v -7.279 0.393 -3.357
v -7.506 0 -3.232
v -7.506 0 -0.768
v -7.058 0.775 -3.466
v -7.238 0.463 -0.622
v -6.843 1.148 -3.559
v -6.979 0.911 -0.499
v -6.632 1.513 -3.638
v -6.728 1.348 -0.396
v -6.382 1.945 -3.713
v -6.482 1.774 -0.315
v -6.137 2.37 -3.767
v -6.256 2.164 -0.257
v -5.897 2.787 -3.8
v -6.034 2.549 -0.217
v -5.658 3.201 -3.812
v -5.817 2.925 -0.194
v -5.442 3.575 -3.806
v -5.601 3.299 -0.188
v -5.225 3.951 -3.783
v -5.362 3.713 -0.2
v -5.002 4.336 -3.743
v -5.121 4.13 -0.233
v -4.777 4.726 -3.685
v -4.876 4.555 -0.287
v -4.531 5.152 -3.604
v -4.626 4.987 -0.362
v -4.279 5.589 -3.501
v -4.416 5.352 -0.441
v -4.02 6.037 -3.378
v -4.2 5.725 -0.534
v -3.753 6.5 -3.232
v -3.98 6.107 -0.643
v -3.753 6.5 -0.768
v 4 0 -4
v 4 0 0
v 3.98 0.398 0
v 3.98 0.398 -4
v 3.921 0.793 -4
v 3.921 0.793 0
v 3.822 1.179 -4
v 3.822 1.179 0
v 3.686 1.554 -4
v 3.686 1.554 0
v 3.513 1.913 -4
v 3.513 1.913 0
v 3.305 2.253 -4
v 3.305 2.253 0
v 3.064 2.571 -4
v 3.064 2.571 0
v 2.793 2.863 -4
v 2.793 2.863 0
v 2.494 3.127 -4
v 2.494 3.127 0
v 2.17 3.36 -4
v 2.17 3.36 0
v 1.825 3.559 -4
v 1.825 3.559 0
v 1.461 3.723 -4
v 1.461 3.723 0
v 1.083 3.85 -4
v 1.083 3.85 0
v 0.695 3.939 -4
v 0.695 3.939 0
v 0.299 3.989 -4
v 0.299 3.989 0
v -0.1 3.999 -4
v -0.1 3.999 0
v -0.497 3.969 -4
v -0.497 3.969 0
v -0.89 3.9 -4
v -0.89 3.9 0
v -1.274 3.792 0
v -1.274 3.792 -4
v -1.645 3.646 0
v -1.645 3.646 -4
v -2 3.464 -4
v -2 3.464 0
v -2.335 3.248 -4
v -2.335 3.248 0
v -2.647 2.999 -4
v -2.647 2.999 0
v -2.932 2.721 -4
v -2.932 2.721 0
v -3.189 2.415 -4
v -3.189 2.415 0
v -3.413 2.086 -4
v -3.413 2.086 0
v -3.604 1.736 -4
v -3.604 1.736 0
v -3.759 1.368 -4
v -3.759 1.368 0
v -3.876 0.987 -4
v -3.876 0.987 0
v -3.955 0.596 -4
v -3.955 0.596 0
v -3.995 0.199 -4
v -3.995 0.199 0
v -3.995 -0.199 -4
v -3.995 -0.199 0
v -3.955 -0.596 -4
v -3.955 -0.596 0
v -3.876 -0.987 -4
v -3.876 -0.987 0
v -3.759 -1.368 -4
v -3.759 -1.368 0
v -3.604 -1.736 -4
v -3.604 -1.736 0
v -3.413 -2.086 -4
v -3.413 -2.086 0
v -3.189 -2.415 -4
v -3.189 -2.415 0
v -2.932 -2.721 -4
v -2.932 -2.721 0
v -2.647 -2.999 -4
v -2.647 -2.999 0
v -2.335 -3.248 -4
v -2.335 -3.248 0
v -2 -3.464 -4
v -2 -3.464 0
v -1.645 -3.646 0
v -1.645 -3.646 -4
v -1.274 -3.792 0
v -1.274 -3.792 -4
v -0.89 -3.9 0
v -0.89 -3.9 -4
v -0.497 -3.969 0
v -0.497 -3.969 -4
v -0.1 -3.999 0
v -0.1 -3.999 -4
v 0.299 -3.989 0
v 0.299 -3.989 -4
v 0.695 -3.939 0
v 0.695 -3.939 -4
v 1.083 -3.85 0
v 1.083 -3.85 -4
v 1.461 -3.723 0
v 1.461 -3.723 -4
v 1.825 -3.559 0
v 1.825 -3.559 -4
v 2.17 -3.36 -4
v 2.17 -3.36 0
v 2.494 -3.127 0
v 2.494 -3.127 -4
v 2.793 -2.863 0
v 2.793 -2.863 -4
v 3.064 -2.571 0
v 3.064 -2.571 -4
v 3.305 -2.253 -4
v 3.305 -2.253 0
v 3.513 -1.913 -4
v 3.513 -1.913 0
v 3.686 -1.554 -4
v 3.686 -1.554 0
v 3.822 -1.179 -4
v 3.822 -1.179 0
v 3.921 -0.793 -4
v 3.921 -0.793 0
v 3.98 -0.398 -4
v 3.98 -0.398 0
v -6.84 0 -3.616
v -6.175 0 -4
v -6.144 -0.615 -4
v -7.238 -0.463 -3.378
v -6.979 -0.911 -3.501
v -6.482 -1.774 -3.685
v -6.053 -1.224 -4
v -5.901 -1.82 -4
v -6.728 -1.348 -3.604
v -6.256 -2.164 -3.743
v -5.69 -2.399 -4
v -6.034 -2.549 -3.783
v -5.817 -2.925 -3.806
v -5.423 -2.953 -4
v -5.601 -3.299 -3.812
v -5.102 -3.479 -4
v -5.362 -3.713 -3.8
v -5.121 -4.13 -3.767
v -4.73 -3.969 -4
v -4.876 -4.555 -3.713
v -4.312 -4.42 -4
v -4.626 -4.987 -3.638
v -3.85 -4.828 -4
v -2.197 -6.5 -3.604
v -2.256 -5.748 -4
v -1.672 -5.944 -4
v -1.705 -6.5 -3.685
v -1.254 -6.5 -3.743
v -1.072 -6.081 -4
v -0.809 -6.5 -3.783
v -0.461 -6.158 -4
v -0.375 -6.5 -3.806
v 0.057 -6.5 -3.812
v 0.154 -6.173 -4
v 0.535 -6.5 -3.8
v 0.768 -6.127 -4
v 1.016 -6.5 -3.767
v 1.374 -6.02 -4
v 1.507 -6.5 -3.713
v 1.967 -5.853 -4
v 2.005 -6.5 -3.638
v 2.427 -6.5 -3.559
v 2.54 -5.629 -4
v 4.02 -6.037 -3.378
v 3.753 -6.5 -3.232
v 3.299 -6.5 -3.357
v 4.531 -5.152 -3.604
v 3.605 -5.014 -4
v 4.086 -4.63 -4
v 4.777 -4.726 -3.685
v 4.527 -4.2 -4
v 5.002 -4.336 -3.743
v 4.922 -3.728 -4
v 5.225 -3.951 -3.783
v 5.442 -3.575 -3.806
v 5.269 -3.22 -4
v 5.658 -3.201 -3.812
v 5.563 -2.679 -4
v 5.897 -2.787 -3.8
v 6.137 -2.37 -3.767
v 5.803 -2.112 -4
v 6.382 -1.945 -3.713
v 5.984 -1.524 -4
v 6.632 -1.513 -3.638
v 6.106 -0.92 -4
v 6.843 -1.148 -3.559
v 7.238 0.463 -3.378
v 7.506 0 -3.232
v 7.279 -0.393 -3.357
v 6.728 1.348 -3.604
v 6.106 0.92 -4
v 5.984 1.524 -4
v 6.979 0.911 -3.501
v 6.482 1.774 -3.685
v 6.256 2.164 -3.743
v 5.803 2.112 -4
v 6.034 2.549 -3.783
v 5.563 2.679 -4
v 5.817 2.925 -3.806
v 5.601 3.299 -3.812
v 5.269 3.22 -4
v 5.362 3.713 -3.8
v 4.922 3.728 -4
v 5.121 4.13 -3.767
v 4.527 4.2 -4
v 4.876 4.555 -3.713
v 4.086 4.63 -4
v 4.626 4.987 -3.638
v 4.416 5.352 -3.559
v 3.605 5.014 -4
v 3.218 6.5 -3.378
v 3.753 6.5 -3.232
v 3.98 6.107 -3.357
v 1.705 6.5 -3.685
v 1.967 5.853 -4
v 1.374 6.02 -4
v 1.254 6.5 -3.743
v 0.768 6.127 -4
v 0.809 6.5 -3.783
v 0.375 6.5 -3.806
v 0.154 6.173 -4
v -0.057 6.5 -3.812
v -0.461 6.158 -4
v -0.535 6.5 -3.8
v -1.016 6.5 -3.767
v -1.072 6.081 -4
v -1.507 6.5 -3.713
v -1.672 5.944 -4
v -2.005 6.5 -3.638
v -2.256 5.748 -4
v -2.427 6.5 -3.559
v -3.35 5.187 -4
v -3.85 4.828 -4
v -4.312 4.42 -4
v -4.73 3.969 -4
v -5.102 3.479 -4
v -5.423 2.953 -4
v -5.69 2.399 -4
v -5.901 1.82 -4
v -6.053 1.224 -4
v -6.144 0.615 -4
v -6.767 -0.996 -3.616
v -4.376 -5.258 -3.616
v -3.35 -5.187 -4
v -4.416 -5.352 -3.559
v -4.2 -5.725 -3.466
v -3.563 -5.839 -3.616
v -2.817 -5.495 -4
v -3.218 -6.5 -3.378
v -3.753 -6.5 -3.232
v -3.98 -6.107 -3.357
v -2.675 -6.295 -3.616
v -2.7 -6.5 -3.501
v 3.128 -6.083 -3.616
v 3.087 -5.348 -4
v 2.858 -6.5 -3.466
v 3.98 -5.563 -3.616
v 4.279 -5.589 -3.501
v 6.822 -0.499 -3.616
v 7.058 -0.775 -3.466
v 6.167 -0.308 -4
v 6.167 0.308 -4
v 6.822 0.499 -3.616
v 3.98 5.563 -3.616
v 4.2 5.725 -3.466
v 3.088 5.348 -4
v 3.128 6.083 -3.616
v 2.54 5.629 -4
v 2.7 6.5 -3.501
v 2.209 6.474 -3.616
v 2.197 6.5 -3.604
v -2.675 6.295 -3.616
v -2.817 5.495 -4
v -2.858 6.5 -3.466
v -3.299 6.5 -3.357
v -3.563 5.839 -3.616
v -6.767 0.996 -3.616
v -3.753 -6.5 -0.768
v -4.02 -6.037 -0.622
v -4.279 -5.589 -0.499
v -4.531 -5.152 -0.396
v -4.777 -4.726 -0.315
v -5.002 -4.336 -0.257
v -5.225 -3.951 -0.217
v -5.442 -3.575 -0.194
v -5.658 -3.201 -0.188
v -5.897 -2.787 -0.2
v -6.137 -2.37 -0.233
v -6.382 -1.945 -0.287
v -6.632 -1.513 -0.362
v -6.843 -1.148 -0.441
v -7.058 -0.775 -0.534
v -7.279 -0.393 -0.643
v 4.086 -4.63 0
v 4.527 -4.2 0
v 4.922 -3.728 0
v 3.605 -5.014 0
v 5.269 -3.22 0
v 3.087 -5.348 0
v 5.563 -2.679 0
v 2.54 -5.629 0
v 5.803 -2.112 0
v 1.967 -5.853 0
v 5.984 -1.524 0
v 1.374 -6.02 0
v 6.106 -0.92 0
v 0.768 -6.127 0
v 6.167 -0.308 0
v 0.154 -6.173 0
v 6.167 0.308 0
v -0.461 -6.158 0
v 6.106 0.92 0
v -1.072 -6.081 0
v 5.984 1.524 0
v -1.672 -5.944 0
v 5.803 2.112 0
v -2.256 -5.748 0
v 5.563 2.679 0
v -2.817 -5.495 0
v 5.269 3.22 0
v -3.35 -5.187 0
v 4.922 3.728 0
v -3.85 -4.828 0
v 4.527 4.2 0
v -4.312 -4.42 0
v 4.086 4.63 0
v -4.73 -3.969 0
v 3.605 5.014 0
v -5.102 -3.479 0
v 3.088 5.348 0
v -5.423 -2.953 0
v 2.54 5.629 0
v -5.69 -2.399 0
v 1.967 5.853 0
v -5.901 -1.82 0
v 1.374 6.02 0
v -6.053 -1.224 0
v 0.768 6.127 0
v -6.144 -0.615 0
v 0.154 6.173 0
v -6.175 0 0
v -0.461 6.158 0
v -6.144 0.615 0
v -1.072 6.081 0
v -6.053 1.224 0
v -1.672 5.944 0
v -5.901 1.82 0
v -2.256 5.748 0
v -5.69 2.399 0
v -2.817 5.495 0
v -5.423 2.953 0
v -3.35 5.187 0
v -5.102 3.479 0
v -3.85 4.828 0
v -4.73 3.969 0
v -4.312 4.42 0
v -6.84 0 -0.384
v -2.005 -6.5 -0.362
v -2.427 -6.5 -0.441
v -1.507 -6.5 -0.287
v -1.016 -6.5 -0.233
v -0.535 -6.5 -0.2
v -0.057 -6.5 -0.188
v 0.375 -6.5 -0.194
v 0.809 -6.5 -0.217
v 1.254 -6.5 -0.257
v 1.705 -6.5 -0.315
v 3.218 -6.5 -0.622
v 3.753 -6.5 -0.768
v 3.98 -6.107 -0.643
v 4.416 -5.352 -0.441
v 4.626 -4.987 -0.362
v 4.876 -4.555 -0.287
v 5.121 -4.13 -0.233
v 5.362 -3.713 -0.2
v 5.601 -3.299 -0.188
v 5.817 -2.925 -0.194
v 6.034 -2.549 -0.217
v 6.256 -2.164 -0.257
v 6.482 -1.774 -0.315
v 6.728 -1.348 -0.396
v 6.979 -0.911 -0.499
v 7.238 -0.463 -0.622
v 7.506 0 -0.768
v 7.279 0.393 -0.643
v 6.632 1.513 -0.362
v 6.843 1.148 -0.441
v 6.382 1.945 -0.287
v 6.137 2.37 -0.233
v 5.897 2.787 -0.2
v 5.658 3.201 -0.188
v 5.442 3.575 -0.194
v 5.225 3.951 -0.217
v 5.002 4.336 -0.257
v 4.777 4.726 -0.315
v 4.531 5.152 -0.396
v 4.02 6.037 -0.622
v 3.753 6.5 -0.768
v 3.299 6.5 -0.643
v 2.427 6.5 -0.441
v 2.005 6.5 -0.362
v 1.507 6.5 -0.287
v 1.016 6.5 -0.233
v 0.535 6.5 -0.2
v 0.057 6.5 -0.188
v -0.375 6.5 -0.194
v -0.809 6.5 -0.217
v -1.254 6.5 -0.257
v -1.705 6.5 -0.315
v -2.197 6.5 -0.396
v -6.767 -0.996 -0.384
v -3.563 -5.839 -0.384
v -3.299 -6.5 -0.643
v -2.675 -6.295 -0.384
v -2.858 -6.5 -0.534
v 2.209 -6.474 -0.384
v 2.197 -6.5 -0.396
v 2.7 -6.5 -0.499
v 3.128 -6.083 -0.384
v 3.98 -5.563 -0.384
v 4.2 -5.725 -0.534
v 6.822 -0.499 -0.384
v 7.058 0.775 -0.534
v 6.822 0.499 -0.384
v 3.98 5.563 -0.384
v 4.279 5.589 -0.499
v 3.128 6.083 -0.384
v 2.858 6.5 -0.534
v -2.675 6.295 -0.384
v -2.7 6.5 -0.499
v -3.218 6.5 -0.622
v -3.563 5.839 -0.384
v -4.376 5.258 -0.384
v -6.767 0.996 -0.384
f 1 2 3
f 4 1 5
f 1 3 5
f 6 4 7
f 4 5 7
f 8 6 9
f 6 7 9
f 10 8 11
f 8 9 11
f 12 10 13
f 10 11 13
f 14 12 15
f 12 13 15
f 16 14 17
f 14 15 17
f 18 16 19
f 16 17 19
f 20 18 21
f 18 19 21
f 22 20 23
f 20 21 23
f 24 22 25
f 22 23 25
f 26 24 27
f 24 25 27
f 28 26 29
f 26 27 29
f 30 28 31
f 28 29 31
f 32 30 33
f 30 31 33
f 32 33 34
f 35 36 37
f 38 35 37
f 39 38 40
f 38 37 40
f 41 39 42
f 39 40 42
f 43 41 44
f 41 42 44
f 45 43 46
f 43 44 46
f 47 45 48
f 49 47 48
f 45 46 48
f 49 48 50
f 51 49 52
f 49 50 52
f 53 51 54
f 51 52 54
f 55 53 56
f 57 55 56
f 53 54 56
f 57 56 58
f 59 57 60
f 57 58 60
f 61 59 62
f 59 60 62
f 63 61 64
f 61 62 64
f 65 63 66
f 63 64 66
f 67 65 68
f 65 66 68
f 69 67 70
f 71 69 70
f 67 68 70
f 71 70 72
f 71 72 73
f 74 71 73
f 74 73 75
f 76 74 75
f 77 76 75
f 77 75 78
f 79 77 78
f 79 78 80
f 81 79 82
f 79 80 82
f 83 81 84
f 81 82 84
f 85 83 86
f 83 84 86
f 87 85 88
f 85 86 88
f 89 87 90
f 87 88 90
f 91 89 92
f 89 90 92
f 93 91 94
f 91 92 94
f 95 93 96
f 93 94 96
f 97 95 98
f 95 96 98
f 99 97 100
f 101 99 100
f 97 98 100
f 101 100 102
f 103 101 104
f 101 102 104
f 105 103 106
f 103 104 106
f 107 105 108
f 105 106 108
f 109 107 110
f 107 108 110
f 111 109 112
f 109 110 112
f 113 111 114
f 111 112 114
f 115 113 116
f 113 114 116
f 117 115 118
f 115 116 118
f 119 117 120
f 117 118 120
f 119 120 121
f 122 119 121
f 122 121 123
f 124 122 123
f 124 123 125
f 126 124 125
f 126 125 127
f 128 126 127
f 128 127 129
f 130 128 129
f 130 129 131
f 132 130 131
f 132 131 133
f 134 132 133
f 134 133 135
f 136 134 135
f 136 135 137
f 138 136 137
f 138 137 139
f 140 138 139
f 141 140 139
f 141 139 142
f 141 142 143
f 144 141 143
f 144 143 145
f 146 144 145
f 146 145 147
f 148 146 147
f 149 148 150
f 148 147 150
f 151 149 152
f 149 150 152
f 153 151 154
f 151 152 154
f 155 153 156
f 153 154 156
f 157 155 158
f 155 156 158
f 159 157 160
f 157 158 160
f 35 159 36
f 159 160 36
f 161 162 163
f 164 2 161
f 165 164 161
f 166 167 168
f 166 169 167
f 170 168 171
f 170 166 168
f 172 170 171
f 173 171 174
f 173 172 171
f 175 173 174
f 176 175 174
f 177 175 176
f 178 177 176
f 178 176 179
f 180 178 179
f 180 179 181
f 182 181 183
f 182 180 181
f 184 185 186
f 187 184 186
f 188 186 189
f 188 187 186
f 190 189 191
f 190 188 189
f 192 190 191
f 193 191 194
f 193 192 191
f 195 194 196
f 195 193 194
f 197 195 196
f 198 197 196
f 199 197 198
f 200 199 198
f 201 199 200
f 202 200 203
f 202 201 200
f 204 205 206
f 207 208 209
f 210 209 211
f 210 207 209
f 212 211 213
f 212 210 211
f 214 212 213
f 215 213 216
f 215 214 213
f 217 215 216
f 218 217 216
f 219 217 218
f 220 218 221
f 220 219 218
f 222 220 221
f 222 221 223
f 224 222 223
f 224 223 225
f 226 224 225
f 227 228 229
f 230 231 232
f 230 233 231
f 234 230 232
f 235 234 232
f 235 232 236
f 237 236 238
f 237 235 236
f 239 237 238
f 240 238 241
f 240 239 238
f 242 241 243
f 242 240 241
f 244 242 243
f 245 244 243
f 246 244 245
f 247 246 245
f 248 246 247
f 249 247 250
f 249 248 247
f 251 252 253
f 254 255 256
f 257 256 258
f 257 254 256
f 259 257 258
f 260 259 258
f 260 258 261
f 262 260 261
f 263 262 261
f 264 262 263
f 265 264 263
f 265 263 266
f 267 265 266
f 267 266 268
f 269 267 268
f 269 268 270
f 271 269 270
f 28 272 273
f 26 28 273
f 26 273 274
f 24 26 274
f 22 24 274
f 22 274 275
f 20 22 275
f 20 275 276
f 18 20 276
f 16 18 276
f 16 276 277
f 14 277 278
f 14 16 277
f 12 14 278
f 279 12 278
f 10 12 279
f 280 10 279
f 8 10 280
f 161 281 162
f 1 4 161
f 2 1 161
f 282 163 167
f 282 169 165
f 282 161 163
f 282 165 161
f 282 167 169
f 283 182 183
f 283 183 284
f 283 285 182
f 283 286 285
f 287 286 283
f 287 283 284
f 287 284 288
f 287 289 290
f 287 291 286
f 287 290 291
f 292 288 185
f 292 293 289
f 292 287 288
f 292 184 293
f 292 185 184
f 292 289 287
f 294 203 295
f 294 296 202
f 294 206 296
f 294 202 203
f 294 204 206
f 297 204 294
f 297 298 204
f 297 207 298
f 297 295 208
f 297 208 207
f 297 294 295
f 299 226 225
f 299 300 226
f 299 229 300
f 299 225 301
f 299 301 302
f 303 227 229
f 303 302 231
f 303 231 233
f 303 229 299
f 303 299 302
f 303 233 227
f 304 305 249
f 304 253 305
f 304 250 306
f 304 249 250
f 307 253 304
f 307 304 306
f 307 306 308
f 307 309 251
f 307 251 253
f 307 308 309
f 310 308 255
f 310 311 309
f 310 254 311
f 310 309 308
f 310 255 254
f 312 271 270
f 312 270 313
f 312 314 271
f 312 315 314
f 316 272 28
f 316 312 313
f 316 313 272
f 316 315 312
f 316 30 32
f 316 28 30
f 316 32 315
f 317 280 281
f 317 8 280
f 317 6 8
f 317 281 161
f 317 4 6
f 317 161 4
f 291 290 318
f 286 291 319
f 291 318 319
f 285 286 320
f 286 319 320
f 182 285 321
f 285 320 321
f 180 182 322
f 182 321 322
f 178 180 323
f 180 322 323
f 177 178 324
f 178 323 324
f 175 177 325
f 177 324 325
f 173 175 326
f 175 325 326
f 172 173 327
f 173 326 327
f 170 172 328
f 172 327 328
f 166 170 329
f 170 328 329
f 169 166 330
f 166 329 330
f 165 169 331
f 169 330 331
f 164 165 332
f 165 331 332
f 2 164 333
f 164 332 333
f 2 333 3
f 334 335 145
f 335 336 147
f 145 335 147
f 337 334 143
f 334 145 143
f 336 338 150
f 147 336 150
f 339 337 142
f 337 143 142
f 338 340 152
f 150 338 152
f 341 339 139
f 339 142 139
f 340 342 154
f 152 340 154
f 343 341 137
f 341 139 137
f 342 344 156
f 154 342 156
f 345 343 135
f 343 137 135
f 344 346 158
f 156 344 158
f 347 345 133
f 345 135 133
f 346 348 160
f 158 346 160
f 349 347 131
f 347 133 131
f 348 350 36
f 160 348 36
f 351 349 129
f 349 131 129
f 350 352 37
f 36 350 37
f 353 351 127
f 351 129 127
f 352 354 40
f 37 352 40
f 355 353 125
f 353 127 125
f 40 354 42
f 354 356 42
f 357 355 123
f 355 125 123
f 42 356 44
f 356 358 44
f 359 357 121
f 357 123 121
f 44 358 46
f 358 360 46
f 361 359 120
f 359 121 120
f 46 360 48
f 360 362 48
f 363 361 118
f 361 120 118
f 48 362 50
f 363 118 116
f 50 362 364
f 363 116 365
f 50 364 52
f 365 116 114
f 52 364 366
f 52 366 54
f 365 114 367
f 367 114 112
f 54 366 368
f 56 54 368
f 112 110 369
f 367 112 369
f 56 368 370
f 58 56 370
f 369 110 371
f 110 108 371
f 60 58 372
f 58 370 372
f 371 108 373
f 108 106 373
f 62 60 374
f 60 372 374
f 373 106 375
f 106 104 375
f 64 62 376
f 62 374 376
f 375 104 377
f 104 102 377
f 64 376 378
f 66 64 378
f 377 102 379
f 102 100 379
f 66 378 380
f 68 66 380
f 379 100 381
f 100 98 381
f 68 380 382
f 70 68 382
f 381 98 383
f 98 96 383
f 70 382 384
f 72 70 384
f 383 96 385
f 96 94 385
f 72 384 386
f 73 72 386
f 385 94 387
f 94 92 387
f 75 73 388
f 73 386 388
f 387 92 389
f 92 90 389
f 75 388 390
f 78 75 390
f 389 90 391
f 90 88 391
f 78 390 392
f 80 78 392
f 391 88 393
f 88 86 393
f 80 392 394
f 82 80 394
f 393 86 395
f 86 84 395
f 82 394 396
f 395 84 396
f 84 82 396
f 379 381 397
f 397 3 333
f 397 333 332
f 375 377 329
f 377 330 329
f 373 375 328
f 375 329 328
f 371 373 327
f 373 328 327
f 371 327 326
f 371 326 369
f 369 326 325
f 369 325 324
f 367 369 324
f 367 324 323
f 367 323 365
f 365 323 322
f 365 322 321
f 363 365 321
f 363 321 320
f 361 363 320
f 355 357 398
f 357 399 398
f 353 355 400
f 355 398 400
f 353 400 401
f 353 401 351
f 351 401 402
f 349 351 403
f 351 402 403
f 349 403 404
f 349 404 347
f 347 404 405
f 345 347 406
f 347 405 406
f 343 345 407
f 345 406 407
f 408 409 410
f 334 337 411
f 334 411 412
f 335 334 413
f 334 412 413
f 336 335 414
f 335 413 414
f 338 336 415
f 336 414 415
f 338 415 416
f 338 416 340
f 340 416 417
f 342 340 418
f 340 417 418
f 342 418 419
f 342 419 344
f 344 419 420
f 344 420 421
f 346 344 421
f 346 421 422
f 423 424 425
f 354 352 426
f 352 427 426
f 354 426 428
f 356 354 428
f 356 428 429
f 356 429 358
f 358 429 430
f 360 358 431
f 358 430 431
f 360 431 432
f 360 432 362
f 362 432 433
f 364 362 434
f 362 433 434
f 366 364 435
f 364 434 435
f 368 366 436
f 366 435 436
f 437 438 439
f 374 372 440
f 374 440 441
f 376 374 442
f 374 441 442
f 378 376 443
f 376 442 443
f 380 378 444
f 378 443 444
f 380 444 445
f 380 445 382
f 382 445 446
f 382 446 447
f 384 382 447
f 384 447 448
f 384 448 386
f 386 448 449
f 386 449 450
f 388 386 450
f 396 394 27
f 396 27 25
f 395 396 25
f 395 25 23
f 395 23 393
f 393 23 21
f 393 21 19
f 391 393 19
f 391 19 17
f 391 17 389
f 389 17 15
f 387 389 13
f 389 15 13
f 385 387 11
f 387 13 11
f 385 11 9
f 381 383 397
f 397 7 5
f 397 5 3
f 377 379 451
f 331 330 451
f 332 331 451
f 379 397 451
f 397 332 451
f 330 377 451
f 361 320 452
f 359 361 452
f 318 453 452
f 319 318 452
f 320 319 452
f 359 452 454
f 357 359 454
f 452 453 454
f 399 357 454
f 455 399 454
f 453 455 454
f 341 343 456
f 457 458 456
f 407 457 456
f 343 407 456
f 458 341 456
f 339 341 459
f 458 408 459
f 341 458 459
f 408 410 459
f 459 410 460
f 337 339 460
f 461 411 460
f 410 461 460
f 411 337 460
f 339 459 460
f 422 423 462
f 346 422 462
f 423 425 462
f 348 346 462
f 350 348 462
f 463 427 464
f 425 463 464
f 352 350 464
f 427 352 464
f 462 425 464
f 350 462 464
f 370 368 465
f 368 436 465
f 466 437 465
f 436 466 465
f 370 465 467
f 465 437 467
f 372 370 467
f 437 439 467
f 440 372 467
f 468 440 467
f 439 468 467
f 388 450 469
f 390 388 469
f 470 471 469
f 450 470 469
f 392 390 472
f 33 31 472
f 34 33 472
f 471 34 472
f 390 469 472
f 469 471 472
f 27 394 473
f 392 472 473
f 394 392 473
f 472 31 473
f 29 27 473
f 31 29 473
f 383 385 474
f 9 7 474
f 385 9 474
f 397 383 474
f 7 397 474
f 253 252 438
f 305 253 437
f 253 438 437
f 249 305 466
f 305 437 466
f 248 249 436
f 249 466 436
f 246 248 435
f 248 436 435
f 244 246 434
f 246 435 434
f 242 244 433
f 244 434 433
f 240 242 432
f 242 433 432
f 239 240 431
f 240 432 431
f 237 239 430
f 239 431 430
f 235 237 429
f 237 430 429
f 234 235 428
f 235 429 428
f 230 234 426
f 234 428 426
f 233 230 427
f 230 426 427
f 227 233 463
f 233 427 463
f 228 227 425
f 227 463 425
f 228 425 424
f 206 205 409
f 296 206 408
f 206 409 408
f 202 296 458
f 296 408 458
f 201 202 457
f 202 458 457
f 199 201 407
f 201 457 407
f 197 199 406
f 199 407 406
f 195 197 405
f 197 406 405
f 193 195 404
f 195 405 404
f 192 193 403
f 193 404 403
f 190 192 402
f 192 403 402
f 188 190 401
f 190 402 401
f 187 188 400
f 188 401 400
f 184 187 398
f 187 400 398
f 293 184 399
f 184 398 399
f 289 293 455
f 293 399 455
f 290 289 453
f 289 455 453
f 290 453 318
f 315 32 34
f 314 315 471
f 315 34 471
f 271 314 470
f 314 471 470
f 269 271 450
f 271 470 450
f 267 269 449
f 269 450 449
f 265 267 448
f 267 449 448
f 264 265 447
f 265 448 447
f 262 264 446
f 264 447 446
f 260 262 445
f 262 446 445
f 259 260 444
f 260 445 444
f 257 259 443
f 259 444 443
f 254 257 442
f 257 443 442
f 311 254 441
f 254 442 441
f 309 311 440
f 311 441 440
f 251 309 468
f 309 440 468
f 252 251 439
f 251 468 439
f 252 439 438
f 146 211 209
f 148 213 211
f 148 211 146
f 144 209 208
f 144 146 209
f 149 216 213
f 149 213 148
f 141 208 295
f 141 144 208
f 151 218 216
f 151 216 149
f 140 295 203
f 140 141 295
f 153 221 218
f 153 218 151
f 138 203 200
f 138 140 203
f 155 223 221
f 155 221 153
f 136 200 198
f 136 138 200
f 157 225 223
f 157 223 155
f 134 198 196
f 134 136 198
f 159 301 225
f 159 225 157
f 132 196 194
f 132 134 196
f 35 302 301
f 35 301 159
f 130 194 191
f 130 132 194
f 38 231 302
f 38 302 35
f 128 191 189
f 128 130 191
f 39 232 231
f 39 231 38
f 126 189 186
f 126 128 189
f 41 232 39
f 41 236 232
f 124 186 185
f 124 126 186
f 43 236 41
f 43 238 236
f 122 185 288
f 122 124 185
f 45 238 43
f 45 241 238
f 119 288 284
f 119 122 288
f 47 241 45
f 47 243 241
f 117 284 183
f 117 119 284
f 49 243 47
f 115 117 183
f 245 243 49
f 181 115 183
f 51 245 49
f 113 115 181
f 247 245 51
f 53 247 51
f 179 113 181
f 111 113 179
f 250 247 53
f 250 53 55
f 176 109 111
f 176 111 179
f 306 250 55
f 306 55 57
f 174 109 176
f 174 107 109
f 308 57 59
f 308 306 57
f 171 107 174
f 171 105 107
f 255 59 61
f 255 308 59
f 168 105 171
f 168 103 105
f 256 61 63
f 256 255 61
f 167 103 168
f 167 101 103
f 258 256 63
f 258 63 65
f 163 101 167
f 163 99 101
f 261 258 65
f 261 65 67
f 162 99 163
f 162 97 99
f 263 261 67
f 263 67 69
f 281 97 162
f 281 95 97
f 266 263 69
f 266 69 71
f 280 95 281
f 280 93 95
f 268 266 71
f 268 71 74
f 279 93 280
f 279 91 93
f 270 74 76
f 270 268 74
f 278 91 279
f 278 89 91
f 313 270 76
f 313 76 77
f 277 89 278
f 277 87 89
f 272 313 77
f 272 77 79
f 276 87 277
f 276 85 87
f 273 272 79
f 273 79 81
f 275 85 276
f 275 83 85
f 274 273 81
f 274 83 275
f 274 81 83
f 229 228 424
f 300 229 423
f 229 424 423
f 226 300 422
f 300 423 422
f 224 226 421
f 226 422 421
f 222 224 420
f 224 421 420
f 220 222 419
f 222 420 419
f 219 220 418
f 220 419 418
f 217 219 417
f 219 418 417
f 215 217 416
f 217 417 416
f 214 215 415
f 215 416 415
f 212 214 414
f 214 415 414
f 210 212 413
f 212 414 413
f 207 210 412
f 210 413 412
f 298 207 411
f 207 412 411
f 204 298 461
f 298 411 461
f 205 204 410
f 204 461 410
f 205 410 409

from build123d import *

# Parameters (mm, degrees)
BASENUTSKE_R       = 4
BASENUT_DEPTH      = 4
SKETCH6_OUTSIDE_W  = 38.384
SKETCH6_OUTSIDE_H  = 36.372
SKETCH6_OUTSIDE_R  = 6.175
CUT_EXTRUDE2_DEPTH = 5
CUT_EXTRUDE2_TAPER = 60


with BuildPart() as part:
    # BaseNutSke → BaseNut (new body)
    with BuildSketch(Plane.XY):
        Polygon((3.75277675, -6.5), (-3.75277675, -6.5), (-7.505553499, 0), (-3.75277675, 6.5), (3.75277675, 6.5), (7.505553499, 0), align=None)
        Circle(BASENUTSKE_R, mode=Mode.SUBTRACT)
    extrude(amount=-BASENUT_DEPTH)

    # Sketch6 outside → Cut-Extrude2 (cut, through all)
    with BuildSketch(Plane(origin=(0, 0, -4), x_dir=(-1, 0, 0), z_dir=(0, 0, -1))):
        Rectangle(SKETCH6_OUTSIDE_W, SKETCH6_OUTSIDE_H)
        Circle(SKETCH6_OUTSIDE_R, mode=Mode.SUBTRACT)
    cut_extrude2 = extrude(amount=-CUT_EXTRUDE2_DEPTH, taper=CUT_EXTRUDE2_TAPER, mode=Mode.SUBTRACT)

    # Mirror1: Cut-Extrude2 across plane
    add(cut_extrude2.mirror(Plane(origin=(0, 0, -2), x_dir=(1, 0, 0), z_dir=(0, 0, -1))), mode=Mode.SUBTRACT)


solid = part.part
